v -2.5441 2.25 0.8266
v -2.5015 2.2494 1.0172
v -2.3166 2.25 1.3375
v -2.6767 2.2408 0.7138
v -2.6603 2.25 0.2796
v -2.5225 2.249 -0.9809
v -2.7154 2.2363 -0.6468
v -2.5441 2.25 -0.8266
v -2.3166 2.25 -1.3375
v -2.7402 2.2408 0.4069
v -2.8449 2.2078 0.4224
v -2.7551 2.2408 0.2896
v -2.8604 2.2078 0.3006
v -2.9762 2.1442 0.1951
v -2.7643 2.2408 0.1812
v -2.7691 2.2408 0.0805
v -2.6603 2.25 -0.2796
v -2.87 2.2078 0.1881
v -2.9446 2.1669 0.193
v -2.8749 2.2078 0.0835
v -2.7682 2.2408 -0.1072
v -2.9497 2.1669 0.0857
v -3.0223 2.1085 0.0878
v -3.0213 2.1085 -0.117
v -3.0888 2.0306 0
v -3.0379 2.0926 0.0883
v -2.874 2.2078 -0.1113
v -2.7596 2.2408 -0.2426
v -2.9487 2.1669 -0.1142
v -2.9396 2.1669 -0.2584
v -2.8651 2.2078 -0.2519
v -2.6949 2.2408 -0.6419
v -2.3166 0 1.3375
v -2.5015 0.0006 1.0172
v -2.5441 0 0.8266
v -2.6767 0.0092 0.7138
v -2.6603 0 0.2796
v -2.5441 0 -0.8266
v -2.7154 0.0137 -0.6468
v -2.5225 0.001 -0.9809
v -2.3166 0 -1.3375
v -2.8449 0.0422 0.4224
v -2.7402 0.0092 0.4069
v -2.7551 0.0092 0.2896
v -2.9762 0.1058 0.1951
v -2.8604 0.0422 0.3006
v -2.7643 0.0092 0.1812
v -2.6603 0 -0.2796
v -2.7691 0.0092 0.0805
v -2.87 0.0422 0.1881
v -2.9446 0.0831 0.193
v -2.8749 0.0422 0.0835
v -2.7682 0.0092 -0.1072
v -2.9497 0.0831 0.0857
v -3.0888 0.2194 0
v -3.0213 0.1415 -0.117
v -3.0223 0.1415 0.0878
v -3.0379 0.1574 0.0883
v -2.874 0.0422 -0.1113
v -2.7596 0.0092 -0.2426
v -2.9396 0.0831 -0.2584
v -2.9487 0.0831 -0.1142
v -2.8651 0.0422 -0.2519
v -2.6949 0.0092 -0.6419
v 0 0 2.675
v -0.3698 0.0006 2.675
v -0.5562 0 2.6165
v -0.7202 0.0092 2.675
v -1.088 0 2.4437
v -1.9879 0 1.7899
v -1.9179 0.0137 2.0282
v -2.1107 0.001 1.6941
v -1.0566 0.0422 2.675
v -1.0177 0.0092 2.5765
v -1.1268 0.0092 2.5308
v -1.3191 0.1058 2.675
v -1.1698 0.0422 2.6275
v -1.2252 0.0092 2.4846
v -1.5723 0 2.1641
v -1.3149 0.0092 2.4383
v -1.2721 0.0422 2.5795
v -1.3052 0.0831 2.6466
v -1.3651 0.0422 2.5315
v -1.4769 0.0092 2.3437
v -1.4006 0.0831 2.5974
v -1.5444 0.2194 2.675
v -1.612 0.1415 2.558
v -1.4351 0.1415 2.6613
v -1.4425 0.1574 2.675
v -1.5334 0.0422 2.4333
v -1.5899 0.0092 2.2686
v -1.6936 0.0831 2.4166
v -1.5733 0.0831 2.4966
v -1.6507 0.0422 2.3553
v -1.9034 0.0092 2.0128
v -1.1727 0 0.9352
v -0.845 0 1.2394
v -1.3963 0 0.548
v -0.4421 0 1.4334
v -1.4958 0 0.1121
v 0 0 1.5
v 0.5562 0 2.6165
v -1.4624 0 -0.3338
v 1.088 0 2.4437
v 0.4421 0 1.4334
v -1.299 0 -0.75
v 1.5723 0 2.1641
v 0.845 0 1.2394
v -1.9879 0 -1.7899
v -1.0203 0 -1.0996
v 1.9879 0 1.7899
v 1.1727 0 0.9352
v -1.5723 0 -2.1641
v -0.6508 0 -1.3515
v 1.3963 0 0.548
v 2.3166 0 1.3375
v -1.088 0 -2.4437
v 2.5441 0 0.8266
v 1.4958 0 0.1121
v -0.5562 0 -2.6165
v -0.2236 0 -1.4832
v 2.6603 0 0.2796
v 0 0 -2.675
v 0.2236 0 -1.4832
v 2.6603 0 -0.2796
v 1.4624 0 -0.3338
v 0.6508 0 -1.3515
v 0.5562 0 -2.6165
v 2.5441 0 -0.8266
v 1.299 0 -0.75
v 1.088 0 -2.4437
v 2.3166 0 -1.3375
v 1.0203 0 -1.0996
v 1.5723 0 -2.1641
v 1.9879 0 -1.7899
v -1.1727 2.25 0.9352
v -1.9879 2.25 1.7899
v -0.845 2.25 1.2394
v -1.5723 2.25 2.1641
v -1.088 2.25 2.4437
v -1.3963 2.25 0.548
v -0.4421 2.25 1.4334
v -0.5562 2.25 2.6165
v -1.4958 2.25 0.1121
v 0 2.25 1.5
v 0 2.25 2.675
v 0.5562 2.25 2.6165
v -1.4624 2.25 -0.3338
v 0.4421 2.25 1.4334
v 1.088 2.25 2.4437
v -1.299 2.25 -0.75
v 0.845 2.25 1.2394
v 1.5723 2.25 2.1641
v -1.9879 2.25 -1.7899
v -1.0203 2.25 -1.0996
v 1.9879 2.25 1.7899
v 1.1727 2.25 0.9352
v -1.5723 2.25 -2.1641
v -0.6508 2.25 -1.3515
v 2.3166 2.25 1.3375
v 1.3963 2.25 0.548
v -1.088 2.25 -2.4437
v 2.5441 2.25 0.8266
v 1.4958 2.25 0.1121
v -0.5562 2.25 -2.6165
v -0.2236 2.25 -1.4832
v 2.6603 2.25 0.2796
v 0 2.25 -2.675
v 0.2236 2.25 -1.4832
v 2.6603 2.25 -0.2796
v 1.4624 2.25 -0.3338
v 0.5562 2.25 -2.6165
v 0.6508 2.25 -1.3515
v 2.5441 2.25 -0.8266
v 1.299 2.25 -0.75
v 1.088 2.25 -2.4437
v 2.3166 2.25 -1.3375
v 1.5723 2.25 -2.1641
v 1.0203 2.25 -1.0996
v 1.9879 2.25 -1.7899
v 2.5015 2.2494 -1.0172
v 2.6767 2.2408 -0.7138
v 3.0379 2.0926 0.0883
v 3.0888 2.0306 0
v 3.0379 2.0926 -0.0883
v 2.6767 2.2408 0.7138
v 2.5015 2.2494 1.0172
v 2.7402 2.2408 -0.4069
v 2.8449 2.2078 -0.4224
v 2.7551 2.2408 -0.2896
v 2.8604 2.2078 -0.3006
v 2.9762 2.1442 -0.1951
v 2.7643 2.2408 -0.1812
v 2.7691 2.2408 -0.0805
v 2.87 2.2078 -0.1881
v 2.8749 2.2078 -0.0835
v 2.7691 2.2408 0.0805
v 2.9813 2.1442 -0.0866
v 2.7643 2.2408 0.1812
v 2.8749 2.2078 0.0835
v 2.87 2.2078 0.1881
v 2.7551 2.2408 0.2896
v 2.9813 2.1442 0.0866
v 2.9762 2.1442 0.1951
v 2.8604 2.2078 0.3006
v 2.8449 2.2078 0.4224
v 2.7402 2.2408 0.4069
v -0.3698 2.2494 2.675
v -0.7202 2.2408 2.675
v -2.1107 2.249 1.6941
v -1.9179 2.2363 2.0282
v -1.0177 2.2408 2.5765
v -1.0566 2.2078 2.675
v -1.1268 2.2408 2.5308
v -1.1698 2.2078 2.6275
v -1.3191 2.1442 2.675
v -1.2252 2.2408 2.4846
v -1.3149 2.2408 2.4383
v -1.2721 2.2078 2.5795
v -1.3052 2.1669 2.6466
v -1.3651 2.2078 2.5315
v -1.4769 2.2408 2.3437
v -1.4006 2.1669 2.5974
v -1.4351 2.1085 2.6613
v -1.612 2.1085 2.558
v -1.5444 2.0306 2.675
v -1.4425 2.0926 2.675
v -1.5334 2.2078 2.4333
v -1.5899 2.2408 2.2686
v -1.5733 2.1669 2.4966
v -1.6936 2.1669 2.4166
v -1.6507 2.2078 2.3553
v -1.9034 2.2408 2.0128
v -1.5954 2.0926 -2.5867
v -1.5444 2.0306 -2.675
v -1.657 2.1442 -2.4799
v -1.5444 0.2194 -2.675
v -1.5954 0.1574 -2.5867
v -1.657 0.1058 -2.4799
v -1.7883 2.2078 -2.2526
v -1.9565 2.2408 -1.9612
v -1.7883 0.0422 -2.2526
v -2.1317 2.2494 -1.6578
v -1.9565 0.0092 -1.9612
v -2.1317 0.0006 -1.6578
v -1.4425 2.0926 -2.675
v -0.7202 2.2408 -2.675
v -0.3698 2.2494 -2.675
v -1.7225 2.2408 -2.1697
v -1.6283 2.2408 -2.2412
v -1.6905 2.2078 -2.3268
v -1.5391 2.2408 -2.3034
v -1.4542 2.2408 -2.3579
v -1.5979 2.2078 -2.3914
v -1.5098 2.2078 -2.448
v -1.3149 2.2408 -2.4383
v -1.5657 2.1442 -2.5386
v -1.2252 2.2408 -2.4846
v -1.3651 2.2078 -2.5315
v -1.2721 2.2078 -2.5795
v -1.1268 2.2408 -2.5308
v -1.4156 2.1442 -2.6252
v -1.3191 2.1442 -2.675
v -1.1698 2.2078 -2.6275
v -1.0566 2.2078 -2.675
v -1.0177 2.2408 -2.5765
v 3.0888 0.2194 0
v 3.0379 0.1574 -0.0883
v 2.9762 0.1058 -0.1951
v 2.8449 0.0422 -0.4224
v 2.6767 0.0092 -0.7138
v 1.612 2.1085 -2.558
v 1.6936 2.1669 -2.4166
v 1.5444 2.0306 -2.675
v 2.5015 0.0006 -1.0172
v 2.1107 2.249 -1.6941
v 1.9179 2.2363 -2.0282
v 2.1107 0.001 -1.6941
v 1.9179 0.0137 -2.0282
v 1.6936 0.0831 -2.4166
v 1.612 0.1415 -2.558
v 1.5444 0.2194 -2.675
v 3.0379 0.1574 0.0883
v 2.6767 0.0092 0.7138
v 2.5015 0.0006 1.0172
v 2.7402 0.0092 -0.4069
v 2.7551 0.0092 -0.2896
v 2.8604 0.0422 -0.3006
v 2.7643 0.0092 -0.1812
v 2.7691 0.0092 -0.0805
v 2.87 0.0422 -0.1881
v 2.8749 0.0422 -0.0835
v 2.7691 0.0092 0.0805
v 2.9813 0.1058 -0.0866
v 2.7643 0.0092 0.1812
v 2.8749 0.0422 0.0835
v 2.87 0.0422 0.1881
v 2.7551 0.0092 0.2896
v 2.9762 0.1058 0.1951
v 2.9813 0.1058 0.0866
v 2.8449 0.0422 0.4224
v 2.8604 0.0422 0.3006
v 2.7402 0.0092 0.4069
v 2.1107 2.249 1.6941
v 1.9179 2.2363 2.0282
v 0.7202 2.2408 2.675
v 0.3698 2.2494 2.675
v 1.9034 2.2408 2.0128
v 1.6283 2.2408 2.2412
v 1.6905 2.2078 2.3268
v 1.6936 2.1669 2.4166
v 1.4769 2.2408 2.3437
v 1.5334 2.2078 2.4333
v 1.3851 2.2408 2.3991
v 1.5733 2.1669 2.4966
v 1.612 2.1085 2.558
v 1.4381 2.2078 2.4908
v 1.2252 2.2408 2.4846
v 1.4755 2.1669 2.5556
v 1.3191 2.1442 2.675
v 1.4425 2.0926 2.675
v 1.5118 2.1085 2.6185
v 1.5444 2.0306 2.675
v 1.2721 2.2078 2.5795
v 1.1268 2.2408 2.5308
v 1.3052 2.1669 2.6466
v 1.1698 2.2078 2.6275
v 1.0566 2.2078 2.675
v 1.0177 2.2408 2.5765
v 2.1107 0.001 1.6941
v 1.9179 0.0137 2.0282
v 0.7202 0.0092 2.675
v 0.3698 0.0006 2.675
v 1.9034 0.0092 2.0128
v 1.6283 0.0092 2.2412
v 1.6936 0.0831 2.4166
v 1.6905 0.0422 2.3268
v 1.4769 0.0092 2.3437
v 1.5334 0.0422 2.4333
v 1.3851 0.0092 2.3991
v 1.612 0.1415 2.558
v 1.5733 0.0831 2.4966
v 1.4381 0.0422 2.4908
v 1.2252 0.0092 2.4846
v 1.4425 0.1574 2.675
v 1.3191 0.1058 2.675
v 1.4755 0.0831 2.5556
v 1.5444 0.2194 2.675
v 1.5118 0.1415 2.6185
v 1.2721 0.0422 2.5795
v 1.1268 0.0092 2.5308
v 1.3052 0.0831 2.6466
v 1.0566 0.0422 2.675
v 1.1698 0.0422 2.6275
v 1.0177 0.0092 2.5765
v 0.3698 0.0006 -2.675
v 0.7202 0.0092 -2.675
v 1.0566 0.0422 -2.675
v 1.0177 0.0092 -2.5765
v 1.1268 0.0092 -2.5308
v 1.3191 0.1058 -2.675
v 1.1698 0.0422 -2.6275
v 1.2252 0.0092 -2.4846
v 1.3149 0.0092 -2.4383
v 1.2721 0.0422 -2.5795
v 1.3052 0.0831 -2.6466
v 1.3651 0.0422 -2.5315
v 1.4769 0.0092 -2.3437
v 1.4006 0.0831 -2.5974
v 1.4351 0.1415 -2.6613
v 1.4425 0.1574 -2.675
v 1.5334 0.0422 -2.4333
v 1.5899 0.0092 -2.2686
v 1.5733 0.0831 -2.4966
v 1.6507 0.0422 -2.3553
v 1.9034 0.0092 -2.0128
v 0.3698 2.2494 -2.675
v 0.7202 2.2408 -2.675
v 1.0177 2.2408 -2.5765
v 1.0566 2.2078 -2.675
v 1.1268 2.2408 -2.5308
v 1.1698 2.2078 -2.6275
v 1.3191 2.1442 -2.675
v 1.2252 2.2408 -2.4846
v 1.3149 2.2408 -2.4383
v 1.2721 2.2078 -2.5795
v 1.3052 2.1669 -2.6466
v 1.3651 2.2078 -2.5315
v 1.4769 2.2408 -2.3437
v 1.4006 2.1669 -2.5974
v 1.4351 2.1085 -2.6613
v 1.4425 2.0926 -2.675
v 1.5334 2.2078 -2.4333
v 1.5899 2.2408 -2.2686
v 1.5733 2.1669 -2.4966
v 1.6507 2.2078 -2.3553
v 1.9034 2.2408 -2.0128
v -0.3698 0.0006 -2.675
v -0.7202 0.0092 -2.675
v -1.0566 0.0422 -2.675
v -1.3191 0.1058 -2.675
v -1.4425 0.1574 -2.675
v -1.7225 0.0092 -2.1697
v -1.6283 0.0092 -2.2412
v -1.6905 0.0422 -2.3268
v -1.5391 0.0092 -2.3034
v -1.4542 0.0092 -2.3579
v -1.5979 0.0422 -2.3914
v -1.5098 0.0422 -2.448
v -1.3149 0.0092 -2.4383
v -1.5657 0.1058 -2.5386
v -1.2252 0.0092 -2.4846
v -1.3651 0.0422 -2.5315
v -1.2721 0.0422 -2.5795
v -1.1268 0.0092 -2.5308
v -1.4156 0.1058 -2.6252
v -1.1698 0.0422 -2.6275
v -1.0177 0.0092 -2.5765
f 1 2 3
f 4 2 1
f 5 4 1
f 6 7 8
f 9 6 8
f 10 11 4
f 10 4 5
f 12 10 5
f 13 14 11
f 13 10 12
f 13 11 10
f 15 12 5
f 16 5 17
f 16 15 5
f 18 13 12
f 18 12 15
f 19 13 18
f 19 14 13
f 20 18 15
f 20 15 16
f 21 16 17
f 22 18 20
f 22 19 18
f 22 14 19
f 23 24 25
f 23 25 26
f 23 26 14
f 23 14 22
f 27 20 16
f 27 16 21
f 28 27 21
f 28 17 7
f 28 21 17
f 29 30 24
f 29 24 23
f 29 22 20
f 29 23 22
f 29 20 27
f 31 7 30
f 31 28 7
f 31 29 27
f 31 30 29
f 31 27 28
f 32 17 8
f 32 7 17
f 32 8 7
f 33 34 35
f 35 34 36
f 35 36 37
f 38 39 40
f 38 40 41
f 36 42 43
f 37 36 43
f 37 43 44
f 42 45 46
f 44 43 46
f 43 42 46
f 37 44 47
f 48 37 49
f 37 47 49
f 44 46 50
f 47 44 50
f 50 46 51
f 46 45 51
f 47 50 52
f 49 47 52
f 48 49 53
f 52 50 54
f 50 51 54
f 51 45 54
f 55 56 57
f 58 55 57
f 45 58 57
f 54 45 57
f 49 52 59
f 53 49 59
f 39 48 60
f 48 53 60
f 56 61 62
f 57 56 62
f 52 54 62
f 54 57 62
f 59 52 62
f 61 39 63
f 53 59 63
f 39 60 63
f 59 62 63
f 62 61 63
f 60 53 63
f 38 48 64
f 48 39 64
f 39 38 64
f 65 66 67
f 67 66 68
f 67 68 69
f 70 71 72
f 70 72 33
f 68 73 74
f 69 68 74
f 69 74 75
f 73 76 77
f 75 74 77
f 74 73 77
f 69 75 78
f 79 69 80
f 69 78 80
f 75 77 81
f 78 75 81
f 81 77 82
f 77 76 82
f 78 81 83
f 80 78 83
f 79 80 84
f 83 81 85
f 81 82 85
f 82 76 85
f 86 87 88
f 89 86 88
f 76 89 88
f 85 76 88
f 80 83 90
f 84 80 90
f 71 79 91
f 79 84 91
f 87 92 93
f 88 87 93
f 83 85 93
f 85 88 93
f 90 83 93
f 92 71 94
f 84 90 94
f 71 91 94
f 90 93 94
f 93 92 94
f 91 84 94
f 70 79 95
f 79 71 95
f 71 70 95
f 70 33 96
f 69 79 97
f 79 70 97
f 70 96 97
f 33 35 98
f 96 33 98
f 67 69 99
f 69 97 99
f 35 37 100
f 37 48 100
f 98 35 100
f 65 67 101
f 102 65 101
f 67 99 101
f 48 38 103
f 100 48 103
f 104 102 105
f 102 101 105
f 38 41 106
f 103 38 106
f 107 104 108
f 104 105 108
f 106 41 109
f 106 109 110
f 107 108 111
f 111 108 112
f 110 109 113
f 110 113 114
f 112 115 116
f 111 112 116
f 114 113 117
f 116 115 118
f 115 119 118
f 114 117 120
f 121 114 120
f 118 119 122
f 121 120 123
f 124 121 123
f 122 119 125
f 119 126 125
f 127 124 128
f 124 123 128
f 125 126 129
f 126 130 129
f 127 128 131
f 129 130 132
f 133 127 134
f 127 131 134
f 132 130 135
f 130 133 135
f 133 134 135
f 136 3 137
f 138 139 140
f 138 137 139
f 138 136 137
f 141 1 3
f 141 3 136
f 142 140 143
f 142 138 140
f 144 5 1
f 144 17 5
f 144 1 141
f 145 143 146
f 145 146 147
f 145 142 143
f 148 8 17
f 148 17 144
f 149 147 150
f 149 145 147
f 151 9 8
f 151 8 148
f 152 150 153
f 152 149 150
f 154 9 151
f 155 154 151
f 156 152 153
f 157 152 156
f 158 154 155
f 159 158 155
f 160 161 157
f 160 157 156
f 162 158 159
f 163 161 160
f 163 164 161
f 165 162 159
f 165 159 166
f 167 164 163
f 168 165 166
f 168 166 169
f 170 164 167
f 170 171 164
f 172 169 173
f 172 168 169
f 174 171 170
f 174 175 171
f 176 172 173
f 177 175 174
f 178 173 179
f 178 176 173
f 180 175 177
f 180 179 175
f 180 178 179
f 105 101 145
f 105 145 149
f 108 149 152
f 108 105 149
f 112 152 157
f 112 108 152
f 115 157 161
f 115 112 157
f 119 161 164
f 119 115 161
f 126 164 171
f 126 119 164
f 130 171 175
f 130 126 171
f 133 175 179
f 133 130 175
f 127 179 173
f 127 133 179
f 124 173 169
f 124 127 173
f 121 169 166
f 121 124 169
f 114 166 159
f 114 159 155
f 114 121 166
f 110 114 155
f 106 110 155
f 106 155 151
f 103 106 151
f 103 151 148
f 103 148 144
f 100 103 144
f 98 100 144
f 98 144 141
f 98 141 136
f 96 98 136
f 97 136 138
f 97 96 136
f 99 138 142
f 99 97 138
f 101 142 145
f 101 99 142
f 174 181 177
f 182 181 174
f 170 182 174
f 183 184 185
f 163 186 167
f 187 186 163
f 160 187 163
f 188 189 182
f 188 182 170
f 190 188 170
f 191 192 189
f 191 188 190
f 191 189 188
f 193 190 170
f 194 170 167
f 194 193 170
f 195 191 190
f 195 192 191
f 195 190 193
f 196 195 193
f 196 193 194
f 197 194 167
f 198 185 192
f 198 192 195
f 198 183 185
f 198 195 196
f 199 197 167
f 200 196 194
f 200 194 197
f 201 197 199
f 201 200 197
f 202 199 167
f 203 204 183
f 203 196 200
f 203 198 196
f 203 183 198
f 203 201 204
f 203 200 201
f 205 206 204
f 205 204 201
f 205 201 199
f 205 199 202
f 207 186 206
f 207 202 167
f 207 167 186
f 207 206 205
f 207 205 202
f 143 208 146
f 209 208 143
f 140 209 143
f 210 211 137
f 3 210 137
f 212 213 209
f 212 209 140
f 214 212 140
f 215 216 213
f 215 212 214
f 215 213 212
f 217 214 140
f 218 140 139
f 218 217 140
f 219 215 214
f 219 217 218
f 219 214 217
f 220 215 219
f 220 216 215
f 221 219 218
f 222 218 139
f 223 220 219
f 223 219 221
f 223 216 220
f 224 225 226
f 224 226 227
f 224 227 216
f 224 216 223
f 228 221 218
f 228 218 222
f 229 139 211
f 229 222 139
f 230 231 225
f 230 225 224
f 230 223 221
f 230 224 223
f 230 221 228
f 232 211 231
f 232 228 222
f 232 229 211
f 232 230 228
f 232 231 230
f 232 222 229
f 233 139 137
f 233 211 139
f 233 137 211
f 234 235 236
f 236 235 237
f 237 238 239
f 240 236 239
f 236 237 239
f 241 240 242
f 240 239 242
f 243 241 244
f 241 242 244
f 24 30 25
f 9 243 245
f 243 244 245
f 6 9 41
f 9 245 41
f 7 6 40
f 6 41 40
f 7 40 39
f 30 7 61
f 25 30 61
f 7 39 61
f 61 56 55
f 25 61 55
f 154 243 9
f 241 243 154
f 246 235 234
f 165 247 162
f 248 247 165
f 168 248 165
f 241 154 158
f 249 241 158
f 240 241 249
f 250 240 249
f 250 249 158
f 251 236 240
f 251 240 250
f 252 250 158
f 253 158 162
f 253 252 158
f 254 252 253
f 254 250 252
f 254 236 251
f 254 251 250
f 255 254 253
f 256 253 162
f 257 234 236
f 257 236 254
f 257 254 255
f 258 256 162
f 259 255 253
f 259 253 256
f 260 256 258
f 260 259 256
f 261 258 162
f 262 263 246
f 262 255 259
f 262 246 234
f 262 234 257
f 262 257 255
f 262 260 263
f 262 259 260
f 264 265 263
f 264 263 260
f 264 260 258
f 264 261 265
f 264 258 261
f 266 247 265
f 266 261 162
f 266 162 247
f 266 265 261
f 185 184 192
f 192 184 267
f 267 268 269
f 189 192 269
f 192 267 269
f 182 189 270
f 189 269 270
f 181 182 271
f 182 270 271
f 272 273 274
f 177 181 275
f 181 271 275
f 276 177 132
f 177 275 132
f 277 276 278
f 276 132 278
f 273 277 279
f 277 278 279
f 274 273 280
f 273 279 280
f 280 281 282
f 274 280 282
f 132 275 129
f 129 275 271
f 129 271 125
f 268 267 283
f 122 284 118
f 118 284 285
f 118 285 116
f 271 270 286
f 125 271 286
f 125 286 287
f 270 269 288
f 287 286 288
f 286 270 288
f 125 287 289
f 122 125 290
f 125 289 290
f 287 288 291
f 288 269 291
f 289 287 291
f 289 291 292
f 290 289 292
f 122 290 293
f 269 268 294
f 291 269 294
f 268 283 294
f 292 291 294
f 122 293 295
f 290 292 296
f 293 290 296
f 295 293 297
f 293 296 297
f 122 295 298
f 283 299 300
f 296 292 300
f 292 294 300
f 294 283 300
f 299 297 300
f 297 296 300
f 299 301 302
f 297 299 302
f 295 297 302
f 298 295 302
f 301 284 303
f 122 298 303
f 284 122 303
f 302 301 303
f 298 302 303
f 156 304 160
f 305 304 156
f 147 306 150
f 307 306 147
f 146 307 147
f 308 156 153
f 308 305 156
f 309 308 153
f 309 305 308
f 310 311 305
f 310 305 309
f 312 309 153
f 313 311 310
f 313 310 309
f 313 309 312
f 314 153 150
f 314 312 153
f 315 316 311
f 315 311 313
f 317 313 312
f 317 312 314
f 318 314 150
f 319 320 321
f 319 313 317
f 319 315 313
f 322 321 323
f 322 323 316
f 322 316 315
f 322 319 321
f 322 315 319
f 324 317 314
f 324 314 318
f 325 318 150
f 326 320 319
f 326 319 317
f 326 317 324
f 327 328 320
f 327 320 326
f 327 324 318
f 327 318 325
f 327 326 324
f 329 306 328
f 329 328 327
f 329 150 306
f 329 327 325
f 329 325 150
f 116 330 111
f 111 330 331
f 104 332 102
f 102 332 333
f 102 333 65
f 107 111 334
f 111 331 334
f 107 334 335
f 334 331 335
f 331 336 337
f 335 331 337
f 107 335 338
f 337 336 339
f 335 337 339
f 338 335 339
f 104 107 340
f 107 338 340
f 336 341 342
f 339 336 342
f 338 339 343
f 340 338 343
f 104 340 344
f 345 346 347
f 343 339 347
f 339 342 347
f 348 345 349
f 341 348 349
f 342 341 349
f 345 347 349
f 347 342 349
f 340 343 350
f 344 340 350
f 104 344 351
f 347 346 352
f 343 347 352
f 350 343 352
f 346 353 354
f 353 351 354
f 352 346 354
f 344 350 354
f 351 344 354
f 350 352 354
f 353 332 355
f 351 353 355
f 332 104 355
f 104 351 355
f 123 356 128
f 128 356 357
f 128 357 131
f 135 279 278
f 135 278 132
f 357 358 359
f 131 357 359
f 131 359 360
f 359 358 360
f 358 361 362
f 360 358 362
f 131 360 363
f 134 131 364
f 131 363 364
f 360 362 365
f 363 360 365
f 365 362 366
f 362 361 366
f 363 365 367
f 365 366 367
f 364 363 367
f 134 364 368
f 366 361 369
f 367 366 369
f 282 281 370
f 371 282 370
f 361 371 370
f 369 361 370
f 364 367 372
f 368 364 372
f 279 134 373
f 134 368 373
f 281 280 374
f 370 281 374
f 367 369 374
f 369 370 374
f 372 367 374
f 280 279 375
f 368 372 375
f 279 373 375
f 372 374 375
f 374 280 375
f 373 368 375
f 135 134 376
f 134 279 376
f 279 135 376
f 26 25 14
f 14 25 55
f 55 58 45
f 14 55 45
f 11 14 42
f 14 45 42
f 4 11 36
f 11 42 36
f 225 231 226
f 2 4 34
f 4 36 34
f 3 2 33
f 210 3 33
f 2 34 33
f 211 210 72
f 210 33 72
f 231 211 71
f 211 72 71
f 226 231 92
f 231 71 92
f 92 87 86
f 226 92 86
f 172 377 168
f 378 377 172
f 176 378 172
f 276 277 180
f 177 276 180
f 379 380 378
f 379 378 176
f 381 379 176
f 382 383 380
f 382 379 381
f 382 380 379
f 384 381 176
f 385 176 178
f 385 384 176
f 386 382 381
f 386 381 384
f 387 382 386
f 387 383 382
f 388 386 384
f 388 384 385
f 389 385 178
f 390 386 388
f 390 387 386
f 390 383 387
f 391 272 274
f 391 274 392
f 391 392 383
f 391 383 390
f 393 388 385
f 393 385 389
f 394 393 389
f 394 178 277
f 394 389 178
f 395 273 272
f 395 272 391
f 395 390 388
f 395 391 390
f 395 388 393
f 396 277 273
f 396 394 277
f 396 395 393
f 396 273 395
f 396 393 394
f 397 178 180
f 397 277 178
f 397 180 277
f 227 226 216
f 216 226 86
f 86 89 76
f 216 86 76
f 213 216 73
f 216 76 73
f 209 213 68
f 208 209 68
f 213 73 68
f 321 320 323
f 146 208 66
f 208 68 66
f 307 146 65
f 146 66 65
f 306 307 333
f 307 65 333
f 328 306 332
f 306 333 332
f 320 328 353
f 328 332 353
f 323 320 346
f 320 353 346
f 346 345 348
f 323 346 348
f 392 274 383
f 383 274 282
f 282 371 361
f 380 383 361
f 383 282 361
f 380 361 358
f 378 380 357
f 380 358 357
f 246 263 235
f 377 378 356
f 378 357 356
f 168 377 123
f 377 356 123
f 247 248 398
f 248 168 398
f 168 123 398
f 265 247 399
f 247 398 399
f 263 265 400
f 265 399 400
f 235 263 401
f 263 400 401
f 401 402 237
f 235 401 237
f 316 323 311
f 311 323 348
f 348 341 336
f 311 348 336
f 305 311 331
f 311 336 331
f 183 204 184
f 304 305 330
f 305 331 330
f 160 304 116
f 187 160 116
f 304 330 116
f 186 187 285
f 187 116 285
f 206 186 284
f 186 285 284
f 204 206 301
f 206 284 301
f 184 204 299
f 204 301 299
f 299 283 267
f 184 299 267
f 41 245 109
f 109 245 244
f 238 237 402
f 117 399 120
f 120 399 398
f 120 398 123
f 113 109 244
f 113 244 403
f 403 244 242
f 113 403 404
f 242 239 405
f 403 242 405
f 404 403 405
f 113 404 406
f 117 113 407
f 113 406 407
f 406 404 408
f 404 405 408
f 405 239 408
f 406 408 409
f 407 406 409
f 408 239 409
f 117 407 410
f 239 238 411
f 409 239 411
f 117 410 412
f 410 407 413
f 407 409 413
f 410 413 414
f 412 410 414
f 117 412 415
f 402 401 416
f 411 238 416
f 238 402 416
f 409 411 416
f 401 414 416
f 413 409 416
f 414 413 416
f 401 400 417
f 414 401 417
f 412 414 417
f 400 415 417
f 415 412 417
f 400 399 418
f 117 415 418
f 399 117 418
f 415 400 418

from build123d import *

# Parameters (mm, degrees)
SKETCH1_R           = 1.5
BOSS_EXTRUDE1_DEPTH = 2.25


with BuildPart() as part:
    # Sketch1 → Boss-Extrude1 (new body)
    with BuildSketch(Plane(origin=(0, 0, 0), x_dir=(1, 0, 0), z_dir=(0, 1, 0))):
        Polygon((1.54441197, 2.675), (-1.54441197, 2.675), (-3.08882394, 0), (-1.54441197, -2.675), (1.54441197, -2.675), (3.08882394, 0), align=None)
        with Locations(Location((0, 0, 0), (0, 0, 270))):
            Circle(SKETCH1_R, mode=Mode.SUBTRACT)
    extrude(amount=BOSS_EXTRUDE1_DEPTH)

    # Sketch2 → Cut-Revolve1 (revolve, cut)
    with BuildSketch(Plane(origin=(0, 0, 0), x_dir=(0, 0, -1), z_dir=(1, 0, 0))):
        with BuildLine():
            Line((0, 2.25), (-2.675, 2.25))
            ThreePointArc((-2.675, 2.25), (-3.012170516, 2.119210025), (-3.17294694, 1.795264171))
            Line((-3.17294694, 1.795264171), (-3.317266919, 1.795264171))
            Line((-3.317266919, 1.795264171), (-3.317266919, 2.57459206))
            Line((-3.317266919, 2.57459206), (0, 2.57459206))
            Line((0, 2.57459206), (0, 2.25))
        make_face()
        with BuildLine():
            Line((0, -0.32459206), (0, 0))
            Line((0, 0), (-2.675, 0))
            ThreePointArc((-2.675, 0), (-3.012170516, 0.130789975), (-3.17294694, 0.454735829))
            Line((-3.17294694, 0.454735829), (-3.317266919, 0.454735829))
            Line((-3.317266919, 0.454735829), (-3.317266919, -0.32459206))
            Line((-3.317266919, -0.32459206), (0, -0.32459206))
        make_face()
    revolve(axis=Axis((0, 2.25, 0), (0, -1, 0)), mode=Mode.SUBTRACT)


solid = part.part
